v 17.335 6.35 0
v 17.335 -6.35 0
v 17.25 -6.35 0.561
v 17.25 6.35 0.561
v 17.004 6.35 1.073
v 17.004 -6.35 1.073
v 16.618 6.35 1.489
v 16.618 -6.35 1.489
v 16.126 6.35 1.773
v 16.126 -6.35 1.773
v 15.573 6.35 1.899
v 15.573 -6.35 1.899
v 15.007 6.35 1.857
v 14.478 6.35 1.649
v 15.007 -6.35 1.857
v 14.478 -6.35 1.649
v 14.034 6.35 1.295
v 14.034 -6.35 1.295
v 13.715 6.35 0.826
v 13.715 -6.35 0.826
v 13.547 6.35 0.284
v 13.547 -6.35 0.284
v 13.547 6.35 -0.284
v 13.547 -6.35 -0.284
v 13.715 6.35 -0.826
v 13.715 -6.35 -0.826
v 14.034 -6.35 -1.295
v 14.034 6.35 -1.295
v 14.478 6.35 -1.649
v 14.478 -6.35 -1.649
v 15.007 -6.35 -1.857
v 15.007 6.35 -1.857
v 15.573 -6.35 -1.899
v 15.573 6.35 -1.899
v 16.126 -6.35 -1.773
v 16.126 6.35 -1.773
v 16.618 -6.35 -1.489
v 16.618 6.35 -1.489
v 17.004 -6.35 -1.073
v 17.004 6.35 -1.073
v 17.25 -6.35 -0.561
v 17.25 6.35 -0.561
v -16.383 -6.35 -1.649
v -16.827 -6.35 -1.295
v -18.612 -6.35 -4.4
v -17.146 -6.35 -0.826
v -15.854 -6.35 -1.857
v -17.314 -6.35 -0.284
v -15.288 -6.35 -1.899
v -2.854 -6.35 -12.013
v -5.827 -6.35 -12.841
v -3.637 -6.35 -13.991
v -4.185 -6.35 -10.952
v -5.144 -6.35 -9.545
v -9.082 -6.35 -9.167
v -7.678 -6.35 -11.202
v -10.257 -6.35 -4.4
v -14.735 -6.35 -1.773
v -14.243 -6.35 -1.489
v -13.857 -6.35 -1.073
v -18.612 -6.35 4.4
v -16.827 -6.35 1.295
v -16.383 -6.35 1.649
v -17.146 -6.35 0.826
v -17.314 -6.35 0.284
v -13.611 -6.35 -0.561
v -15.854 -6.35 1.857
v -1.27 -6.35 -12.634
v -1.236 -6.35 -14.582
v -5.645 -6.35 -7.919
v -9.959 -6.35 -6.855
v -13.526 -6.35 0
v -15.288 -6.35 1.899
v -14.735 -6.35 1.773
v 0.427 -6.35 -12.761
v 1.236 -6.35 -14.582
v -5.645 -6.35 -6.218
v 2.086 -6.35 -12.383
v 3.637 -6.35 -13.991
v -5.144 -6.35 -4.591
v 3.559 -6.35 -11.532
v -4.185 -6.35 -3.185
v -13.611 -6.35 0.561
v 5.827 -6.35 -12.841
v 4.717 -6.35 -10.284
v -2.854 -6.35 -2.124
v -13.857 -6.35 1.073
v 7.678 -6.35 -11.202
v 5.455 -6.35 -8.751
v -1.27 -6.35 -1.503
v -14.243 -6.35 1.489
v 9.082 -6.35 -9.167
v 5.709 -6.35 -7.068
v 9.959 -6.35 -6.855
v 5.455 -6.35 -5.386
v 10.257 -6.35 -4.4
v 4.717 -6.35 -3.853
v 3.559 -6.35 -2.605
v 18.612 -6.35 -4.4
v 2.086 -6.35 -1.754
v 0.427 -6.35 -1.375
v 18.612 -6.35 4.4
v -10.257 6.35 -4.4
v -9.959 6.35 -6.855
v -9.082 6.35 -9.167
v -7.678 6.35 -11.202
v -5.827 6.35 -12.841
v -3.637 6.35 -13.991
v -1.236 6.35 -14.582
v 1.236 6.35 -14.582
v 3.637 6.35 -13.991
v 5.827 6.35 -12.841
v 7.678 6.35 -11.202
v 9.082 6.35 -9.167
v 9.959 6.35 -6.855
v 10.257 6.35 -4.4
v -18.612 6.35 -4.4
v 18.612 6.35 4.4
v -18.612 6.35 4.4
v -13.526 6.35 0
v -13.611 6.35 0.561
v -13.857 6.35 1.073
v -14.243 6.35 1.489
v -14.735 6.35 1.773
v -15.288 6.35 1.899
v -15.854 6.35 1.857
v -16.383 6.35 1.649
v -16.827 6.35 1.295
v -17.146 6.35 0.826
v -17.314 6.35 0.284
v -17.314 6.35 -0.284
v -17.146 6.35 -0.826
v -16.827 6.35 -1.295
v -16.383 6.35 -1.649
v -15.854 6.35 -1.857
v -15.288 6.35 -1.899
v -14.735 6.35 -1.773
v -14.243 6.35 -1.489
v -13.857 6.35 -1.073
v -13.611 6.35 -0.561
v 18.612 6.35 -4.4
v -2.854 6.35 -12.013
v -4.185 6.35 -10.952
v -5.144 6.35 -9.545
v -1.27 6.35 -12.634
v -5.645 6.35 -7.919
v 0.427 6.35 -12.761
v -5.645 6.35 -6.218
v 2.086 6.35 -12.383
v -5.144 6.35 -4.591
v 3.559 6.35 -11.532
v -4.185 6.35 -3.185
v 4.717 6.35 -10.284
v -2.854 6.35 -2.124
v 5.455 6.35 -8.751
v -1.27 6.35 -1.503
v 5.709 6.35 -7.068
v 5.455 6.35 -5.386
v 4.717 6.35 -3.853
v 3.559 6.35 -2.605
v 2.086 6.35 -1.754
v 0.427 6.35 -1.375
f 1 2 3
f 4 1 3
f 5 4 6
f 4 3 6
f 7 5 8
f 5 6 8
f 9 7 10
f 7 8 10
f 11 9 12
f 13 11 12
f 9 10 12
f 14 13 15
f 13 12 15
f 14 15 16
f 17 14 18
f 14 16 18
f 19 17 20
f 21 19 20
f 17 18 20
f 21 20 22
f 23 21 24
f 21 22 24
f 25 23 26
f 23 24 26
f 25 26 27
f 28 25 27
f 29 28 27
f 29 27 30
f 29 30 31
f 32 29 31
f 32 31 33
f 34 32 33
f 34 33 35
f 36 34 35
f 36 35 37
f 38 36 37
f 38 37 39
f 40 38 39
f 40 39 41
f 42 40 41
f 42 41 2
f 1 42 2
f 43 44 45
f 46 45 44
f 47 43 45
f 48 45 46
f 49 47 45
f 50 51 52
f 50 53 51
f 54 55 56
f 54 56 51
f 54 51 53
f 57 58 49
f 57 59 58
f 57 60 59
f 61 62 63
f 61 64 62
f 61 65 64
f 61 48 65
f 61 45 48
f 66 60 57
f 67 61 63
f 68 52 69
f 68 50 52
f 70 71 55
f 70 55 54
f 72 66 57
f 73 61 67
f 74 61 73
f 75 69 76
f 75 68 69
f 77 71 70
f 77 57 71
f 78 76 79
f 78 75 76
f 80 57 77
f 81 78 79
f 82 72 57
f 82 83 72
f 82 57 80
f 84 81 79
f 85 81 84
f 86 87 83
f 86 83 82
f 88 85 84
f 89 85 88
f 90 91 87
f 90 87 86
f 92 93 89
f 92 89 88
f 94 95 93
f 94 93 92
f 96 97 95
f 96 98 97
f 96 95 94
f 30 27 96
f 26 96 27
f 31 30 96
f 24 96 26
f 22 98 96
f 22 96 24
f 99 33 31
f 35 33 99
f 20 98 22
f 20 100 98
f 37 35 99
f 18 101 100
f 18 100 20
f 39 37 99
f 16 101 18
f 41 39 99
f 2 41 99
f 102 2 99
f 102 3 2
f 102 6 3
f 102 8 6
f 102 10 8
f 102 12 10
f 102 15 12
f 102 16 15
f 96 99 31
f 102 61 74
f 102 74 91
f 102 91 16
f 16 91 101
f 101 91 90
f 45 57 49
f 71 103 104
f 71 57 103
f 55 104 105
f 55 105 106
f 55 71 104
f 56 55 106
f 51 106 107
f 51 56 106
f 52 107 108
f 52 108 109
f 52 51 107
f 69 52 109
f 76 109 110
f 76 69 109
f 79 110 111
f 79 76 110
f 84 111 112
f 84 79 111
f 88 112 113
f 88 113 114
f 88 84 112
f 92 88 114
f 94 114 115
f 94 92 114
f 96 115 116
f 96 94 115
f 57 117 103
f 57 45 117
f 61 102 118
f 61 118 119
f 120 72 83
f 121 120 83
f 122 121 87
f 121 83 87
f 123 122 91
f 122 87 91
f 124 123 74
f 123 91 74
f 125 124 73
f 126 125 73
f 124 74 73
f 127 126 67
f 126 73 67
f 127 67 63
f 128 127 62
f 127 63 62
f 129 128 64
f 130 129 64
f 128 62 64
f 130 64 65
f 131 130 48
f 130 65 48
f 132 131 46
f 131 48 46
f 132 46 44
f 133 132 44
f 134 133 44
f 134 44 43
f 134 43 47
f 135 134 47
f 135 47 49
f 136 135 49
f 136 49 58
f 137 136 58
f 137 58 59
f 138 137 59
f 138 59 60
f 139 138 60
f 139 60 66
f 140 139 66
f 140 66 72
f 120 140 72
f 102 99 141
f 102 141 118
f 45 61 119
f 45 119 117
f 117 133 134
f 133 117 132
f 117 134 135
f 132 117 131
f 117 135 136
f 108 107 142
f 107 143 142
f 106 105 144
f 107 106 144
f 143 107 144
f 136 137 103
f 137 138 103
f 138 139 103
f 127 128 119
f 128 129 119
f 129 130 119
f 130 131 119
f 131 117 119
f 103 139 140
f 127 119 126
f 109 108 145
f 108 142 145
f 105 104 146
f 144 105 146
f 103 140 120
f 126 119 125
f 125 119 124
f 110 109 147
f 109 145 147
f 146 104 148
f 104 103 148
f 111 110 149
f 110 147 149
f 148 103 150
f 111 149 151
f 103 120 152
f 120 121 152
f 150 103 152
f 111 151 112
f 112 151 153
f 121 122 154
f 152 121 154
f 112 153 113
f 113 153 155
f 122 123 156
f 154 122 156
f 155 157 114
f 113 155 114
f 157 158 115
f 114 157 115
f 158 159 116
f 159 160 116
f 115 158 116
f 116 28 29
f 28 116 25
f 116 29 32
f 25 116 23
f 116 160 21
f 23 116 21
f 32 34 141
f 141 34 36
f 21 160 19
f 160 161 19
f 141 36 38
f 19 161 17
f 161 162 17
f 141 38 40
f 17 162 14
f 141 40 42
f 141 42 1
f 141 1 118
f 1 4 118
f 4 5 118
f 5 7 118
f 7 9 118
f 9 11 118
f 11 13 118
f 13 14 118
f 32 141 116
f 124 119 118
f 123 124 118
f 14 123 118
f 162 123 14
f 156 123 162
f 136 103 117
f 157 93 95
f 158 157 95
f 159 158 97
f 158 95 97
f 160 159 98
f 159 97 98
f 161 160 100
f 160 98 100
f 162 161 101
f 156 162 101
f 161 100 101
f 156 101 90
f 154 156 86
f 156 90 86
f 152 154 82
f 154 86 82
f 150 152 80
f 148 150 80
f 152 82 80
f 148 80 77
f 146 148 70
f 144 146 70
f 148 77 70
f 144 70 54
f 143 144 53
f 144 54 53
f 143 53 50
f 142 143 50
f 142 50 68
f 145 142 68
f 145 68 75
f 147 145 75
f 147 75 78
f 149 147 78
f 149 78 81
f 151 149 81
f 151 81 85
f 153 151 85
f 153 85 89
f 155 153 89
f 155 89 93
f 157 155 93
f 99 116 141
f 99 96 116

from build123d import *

# Parameters (mm, degrees)
F1_DEPTH      = 6.35
F1_DEPTH_BACK = 6.35
F2_R          = 1.90452
F3_DEPTH      = 15.357033
F4_DEPTH      = 14.148086
F5_R          = 5.708941
F6_DEPTH      = 15.330171


with BuildPart() as f1:
    # F0 (on Front) → F1 (new body, two sides)
    with BuildSketch(Plane.XZ) as f1_sk:
        with BuildLine():
            Line((10.257333, -4.399853), (18.612302, -4.399853))
            Line((18.612302, -4.399853), (18.612302, 4.399853))
            Line((18.612302, 4.399853), (-18.612302, 4.399853))
            Line((-18.612302, 4.399853), (-18.612302, -4.399853))
            Line((-18.612302, -4.399853), (-10.257333, -4.399853))
            ThreePointArc((-10.257333, -4.399853), (0, -14.657186), (10.257333, -4.399853))
        make_face()
    extrude(amount=F1_DEPTH)
    extrude(f1_sk.sketch, amount=-F1_DEPTH_BACK)

    # F2 (on face) → F3 (cut)
    with BuildSketch(Plane.XZ.offset(6.35)):
        with Locations((-15.430572, 0)):
            Circle(F2_R)
    extrude(amount=-F3_DEPTH, mode=Mode.SUBTRACT)

    # F2 (on face) → F4 (cut)
    with BuildSketch(Plane.XZ.offset(6.35)):
        with Locations((15.430572, 0)):
            Circle(F2_R)
    extrude(amount=-F4_DEPTH, mode=Mode.SUBTRACT)

    # F5 (on face) → F6 (cut)
    with BuildSketch(Plane.XZ.offset(6.35)):
        with Locations((0, -7.068473)):
            Circle(F5_R)
    extrude(amount=-F6_DEPTH, mode=Mode.SUBTRACT)


solid = f1.part
